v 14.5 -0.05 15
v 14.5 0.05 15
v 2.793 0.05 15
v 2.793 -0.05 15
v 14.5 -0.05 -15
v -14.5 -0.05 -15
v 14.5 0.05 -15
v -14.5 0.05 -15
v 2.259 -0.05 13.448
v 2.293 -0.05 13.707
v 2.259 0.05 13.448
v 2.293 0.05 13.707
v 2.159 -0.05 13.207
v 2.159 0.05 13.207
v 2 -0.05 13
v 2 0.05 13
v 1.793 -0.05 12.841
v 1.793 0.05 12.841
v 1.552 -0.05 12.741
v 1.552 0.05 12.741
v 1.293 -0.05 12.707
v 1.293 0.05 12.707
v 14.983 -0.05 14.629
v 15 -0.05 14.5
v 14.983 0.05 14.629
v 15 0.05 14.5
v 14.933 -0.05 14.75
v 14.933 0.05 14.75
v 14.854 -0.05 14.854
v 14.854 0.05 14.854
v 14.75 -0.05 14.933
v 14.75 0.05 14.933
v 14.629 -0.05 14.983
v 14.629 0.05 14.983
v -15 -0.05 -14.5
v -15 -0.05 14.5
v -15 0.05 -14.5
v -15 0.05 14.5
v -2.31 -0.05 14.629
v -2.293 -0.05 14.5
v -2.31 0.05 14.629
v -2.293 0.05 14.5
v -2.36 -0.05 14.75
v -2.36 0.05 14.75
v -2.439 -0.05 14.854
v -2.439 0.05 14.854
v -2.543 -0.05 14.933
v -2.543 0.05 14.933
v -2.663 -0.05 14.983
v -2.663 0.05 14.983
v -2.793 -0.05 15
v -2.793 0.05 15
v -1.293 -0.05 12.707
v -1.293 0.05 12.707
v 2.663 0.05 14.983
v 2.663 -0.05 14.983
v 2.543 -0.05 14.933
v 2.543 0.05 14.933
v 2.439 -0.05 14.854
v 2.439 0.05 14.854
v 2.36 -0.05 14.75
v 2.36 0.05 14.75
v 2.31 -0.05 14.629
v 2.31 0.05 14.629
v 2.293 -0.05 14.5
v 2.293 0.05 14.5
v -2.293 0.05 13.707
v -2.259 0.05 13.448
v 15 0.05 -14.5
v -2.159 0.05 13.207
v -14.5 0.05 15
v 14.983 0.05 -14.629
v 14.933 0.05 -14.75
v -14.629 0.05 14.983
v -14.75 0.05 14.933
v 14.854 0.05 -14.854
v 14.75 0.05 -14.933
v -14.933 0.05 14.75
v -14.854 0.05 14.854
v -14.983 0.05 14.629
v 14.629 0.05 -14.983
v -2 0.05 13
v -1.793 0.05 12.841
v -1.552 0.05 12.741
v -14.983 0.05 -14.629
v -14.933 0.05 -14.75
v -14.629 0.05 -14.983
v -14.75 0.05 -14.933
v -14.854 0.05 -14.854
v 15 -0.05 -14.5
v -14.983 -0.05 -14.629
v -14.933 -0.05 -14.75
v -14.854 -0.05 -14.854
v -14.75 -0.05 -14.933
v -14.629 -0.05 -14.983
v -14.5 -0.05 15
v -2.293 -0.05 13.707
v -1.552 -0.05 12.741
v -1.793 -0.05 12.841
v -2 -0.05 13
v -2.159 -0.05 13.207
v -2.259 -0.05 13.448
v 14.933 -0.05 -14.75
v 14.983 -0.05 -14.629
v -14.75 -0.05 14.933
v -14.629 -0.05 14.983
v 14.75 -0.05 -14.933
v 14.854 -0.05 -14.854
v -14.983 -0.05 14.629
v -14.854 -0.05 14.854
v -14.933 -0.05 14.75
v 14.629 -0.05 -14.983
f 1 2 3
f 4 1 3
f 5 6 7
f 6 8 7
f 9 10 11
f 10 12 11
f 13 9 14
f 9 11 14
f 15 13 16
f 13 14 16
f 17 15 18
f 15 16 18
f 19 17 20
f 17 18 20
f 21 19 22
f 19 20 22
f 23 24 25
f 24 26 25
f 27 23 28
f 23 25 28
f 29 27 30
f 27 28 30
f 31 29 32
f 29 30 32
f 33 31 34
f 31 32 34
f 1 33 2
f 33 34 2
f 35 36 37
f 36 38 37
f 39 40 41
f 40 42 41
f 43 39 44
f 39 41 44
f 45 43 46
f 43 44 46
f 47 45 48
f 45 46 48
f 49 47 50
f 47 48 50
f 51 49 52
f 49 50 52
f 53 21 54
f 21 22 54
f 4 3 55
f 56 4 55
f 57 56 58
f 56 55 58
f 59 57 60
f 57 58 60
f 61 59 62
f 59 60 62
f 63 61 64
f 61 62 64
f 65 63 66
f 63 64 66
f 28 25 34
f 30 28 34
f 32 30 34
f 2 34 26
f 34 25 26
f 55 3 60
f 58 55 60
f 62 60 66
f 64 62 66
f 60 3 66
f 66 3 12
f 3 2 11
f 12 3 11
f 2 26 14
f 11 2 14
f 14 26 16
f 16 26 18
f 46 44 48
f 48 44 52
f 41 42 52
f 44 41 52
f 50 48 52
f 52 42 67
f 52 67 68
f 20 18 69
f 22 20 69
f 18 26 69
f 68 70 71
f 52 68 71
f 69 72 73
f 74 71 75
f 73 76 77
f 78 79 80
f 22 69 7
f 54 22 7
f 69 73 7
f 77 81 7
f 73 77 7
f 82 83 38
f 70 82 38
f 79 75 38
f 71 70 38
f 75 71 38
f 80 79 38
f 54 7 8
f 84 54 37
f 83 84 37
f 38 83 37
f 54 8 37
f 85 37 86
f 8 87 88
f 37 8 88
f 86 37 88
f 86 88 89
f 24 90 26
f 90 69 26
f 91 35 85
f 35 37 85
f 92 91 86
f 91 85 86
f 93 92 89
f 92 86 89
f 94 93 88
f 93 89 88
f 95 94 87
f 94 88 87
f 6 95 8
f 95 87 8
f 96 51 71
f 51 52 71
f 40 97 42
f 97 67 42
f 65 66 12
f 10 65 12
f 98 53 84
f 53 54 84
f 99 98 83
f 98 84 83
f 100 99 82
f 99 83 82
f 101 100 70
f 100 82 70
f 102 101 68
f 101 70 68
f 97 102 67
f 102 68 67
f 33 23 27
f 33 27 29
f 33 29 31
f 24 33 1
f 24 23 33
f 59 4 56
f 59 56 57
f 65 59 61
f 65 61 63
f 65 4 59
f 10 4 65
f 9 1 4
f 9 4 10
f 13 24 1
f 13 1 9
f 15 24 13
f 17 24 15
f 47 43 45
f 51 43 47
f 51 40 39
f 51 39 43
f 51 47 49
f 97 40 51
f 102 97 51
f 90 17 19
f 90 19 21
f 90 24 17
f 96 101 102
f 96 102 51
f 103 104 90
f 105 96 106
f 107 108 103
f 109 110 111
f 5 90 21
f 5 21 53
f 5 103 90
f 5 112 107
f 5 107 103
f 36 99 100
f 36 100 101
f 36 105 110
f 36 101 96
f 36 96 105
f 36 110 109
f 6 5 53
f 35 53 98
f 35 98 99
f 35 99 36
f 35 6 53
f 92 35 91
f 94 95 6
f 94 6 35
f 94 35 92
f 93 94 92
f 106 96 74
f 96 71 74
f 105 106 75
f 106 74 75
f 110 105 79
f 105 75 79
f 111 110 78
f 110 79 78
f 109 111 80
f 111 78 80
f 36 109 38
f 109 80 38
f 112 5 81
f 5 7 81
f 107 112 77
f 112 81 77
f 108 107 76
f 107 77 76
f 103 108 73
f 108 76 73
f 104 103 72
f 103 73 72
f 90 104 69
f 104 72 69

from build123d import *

# Parameters (mm, degrees)
BOSS_EXTRUDE1_DEPTH = 0.05


with BuildPart() as part:
    # Sketch1 → Boss-Extrude1 (new, symmetric)
    with BuildSketch(Plane(origin=(0, 0, 0), x_dir=(1, 0, 0), z_dir=(0, 1, 0))):
        with BuildLine():
            Line((2.2929, -14.5), (2.2929, -13.7071))
            ThreePointArc((2.2929, -13.7071), (2.000006781, -12.999993219), (1.2929, -12.7071))
            Line((1.2929, -12.7071), (-1.2929, -12.7071))
            ThreePointArc((-1.2929, -12.7071), (-2.000006781, -12.999993219), (-2.2929, -13.7071))
            Line((-2.2929, -13.7071), (-2.2929, -14.5))
            ThreePointArc((-2.2929, -14.5), (-2.439346609, -14.853553391), (-2.7929, -15))
            Line((-2.7929, -15), (-14.5, -15))
            ThreePointArc((-14.5, -15), (-14.853553391, -14.853553391), (-15, -14.5))
            Line((-15, -14.5), (-15, 14.5))
            ThreePointArc((-15, 14.5), (-14.853553391, 14.853553391), (-14.5, 15))
            Line((-14.5, 15), (14.5, 15))
            ThreePointArc((14.5, 15), (14.853553391, 14.853553391), (15, 14.5))
            Line((15, 14.5), (15, -14.5))
            ThreePointArc((15, -14.5), (14.853553391, -14.853553391), (14.5, -15))
            Line((14.5, -15), (2.7929, -15))
            ThreePointArc((2.7929, -15), (2.439346609, -14.853553391), (2.2929, -14.5))
        make_face()
    extrude(amount=BOSS_EXTRUDE1_DEPTH, both=True)


solid = part.part
